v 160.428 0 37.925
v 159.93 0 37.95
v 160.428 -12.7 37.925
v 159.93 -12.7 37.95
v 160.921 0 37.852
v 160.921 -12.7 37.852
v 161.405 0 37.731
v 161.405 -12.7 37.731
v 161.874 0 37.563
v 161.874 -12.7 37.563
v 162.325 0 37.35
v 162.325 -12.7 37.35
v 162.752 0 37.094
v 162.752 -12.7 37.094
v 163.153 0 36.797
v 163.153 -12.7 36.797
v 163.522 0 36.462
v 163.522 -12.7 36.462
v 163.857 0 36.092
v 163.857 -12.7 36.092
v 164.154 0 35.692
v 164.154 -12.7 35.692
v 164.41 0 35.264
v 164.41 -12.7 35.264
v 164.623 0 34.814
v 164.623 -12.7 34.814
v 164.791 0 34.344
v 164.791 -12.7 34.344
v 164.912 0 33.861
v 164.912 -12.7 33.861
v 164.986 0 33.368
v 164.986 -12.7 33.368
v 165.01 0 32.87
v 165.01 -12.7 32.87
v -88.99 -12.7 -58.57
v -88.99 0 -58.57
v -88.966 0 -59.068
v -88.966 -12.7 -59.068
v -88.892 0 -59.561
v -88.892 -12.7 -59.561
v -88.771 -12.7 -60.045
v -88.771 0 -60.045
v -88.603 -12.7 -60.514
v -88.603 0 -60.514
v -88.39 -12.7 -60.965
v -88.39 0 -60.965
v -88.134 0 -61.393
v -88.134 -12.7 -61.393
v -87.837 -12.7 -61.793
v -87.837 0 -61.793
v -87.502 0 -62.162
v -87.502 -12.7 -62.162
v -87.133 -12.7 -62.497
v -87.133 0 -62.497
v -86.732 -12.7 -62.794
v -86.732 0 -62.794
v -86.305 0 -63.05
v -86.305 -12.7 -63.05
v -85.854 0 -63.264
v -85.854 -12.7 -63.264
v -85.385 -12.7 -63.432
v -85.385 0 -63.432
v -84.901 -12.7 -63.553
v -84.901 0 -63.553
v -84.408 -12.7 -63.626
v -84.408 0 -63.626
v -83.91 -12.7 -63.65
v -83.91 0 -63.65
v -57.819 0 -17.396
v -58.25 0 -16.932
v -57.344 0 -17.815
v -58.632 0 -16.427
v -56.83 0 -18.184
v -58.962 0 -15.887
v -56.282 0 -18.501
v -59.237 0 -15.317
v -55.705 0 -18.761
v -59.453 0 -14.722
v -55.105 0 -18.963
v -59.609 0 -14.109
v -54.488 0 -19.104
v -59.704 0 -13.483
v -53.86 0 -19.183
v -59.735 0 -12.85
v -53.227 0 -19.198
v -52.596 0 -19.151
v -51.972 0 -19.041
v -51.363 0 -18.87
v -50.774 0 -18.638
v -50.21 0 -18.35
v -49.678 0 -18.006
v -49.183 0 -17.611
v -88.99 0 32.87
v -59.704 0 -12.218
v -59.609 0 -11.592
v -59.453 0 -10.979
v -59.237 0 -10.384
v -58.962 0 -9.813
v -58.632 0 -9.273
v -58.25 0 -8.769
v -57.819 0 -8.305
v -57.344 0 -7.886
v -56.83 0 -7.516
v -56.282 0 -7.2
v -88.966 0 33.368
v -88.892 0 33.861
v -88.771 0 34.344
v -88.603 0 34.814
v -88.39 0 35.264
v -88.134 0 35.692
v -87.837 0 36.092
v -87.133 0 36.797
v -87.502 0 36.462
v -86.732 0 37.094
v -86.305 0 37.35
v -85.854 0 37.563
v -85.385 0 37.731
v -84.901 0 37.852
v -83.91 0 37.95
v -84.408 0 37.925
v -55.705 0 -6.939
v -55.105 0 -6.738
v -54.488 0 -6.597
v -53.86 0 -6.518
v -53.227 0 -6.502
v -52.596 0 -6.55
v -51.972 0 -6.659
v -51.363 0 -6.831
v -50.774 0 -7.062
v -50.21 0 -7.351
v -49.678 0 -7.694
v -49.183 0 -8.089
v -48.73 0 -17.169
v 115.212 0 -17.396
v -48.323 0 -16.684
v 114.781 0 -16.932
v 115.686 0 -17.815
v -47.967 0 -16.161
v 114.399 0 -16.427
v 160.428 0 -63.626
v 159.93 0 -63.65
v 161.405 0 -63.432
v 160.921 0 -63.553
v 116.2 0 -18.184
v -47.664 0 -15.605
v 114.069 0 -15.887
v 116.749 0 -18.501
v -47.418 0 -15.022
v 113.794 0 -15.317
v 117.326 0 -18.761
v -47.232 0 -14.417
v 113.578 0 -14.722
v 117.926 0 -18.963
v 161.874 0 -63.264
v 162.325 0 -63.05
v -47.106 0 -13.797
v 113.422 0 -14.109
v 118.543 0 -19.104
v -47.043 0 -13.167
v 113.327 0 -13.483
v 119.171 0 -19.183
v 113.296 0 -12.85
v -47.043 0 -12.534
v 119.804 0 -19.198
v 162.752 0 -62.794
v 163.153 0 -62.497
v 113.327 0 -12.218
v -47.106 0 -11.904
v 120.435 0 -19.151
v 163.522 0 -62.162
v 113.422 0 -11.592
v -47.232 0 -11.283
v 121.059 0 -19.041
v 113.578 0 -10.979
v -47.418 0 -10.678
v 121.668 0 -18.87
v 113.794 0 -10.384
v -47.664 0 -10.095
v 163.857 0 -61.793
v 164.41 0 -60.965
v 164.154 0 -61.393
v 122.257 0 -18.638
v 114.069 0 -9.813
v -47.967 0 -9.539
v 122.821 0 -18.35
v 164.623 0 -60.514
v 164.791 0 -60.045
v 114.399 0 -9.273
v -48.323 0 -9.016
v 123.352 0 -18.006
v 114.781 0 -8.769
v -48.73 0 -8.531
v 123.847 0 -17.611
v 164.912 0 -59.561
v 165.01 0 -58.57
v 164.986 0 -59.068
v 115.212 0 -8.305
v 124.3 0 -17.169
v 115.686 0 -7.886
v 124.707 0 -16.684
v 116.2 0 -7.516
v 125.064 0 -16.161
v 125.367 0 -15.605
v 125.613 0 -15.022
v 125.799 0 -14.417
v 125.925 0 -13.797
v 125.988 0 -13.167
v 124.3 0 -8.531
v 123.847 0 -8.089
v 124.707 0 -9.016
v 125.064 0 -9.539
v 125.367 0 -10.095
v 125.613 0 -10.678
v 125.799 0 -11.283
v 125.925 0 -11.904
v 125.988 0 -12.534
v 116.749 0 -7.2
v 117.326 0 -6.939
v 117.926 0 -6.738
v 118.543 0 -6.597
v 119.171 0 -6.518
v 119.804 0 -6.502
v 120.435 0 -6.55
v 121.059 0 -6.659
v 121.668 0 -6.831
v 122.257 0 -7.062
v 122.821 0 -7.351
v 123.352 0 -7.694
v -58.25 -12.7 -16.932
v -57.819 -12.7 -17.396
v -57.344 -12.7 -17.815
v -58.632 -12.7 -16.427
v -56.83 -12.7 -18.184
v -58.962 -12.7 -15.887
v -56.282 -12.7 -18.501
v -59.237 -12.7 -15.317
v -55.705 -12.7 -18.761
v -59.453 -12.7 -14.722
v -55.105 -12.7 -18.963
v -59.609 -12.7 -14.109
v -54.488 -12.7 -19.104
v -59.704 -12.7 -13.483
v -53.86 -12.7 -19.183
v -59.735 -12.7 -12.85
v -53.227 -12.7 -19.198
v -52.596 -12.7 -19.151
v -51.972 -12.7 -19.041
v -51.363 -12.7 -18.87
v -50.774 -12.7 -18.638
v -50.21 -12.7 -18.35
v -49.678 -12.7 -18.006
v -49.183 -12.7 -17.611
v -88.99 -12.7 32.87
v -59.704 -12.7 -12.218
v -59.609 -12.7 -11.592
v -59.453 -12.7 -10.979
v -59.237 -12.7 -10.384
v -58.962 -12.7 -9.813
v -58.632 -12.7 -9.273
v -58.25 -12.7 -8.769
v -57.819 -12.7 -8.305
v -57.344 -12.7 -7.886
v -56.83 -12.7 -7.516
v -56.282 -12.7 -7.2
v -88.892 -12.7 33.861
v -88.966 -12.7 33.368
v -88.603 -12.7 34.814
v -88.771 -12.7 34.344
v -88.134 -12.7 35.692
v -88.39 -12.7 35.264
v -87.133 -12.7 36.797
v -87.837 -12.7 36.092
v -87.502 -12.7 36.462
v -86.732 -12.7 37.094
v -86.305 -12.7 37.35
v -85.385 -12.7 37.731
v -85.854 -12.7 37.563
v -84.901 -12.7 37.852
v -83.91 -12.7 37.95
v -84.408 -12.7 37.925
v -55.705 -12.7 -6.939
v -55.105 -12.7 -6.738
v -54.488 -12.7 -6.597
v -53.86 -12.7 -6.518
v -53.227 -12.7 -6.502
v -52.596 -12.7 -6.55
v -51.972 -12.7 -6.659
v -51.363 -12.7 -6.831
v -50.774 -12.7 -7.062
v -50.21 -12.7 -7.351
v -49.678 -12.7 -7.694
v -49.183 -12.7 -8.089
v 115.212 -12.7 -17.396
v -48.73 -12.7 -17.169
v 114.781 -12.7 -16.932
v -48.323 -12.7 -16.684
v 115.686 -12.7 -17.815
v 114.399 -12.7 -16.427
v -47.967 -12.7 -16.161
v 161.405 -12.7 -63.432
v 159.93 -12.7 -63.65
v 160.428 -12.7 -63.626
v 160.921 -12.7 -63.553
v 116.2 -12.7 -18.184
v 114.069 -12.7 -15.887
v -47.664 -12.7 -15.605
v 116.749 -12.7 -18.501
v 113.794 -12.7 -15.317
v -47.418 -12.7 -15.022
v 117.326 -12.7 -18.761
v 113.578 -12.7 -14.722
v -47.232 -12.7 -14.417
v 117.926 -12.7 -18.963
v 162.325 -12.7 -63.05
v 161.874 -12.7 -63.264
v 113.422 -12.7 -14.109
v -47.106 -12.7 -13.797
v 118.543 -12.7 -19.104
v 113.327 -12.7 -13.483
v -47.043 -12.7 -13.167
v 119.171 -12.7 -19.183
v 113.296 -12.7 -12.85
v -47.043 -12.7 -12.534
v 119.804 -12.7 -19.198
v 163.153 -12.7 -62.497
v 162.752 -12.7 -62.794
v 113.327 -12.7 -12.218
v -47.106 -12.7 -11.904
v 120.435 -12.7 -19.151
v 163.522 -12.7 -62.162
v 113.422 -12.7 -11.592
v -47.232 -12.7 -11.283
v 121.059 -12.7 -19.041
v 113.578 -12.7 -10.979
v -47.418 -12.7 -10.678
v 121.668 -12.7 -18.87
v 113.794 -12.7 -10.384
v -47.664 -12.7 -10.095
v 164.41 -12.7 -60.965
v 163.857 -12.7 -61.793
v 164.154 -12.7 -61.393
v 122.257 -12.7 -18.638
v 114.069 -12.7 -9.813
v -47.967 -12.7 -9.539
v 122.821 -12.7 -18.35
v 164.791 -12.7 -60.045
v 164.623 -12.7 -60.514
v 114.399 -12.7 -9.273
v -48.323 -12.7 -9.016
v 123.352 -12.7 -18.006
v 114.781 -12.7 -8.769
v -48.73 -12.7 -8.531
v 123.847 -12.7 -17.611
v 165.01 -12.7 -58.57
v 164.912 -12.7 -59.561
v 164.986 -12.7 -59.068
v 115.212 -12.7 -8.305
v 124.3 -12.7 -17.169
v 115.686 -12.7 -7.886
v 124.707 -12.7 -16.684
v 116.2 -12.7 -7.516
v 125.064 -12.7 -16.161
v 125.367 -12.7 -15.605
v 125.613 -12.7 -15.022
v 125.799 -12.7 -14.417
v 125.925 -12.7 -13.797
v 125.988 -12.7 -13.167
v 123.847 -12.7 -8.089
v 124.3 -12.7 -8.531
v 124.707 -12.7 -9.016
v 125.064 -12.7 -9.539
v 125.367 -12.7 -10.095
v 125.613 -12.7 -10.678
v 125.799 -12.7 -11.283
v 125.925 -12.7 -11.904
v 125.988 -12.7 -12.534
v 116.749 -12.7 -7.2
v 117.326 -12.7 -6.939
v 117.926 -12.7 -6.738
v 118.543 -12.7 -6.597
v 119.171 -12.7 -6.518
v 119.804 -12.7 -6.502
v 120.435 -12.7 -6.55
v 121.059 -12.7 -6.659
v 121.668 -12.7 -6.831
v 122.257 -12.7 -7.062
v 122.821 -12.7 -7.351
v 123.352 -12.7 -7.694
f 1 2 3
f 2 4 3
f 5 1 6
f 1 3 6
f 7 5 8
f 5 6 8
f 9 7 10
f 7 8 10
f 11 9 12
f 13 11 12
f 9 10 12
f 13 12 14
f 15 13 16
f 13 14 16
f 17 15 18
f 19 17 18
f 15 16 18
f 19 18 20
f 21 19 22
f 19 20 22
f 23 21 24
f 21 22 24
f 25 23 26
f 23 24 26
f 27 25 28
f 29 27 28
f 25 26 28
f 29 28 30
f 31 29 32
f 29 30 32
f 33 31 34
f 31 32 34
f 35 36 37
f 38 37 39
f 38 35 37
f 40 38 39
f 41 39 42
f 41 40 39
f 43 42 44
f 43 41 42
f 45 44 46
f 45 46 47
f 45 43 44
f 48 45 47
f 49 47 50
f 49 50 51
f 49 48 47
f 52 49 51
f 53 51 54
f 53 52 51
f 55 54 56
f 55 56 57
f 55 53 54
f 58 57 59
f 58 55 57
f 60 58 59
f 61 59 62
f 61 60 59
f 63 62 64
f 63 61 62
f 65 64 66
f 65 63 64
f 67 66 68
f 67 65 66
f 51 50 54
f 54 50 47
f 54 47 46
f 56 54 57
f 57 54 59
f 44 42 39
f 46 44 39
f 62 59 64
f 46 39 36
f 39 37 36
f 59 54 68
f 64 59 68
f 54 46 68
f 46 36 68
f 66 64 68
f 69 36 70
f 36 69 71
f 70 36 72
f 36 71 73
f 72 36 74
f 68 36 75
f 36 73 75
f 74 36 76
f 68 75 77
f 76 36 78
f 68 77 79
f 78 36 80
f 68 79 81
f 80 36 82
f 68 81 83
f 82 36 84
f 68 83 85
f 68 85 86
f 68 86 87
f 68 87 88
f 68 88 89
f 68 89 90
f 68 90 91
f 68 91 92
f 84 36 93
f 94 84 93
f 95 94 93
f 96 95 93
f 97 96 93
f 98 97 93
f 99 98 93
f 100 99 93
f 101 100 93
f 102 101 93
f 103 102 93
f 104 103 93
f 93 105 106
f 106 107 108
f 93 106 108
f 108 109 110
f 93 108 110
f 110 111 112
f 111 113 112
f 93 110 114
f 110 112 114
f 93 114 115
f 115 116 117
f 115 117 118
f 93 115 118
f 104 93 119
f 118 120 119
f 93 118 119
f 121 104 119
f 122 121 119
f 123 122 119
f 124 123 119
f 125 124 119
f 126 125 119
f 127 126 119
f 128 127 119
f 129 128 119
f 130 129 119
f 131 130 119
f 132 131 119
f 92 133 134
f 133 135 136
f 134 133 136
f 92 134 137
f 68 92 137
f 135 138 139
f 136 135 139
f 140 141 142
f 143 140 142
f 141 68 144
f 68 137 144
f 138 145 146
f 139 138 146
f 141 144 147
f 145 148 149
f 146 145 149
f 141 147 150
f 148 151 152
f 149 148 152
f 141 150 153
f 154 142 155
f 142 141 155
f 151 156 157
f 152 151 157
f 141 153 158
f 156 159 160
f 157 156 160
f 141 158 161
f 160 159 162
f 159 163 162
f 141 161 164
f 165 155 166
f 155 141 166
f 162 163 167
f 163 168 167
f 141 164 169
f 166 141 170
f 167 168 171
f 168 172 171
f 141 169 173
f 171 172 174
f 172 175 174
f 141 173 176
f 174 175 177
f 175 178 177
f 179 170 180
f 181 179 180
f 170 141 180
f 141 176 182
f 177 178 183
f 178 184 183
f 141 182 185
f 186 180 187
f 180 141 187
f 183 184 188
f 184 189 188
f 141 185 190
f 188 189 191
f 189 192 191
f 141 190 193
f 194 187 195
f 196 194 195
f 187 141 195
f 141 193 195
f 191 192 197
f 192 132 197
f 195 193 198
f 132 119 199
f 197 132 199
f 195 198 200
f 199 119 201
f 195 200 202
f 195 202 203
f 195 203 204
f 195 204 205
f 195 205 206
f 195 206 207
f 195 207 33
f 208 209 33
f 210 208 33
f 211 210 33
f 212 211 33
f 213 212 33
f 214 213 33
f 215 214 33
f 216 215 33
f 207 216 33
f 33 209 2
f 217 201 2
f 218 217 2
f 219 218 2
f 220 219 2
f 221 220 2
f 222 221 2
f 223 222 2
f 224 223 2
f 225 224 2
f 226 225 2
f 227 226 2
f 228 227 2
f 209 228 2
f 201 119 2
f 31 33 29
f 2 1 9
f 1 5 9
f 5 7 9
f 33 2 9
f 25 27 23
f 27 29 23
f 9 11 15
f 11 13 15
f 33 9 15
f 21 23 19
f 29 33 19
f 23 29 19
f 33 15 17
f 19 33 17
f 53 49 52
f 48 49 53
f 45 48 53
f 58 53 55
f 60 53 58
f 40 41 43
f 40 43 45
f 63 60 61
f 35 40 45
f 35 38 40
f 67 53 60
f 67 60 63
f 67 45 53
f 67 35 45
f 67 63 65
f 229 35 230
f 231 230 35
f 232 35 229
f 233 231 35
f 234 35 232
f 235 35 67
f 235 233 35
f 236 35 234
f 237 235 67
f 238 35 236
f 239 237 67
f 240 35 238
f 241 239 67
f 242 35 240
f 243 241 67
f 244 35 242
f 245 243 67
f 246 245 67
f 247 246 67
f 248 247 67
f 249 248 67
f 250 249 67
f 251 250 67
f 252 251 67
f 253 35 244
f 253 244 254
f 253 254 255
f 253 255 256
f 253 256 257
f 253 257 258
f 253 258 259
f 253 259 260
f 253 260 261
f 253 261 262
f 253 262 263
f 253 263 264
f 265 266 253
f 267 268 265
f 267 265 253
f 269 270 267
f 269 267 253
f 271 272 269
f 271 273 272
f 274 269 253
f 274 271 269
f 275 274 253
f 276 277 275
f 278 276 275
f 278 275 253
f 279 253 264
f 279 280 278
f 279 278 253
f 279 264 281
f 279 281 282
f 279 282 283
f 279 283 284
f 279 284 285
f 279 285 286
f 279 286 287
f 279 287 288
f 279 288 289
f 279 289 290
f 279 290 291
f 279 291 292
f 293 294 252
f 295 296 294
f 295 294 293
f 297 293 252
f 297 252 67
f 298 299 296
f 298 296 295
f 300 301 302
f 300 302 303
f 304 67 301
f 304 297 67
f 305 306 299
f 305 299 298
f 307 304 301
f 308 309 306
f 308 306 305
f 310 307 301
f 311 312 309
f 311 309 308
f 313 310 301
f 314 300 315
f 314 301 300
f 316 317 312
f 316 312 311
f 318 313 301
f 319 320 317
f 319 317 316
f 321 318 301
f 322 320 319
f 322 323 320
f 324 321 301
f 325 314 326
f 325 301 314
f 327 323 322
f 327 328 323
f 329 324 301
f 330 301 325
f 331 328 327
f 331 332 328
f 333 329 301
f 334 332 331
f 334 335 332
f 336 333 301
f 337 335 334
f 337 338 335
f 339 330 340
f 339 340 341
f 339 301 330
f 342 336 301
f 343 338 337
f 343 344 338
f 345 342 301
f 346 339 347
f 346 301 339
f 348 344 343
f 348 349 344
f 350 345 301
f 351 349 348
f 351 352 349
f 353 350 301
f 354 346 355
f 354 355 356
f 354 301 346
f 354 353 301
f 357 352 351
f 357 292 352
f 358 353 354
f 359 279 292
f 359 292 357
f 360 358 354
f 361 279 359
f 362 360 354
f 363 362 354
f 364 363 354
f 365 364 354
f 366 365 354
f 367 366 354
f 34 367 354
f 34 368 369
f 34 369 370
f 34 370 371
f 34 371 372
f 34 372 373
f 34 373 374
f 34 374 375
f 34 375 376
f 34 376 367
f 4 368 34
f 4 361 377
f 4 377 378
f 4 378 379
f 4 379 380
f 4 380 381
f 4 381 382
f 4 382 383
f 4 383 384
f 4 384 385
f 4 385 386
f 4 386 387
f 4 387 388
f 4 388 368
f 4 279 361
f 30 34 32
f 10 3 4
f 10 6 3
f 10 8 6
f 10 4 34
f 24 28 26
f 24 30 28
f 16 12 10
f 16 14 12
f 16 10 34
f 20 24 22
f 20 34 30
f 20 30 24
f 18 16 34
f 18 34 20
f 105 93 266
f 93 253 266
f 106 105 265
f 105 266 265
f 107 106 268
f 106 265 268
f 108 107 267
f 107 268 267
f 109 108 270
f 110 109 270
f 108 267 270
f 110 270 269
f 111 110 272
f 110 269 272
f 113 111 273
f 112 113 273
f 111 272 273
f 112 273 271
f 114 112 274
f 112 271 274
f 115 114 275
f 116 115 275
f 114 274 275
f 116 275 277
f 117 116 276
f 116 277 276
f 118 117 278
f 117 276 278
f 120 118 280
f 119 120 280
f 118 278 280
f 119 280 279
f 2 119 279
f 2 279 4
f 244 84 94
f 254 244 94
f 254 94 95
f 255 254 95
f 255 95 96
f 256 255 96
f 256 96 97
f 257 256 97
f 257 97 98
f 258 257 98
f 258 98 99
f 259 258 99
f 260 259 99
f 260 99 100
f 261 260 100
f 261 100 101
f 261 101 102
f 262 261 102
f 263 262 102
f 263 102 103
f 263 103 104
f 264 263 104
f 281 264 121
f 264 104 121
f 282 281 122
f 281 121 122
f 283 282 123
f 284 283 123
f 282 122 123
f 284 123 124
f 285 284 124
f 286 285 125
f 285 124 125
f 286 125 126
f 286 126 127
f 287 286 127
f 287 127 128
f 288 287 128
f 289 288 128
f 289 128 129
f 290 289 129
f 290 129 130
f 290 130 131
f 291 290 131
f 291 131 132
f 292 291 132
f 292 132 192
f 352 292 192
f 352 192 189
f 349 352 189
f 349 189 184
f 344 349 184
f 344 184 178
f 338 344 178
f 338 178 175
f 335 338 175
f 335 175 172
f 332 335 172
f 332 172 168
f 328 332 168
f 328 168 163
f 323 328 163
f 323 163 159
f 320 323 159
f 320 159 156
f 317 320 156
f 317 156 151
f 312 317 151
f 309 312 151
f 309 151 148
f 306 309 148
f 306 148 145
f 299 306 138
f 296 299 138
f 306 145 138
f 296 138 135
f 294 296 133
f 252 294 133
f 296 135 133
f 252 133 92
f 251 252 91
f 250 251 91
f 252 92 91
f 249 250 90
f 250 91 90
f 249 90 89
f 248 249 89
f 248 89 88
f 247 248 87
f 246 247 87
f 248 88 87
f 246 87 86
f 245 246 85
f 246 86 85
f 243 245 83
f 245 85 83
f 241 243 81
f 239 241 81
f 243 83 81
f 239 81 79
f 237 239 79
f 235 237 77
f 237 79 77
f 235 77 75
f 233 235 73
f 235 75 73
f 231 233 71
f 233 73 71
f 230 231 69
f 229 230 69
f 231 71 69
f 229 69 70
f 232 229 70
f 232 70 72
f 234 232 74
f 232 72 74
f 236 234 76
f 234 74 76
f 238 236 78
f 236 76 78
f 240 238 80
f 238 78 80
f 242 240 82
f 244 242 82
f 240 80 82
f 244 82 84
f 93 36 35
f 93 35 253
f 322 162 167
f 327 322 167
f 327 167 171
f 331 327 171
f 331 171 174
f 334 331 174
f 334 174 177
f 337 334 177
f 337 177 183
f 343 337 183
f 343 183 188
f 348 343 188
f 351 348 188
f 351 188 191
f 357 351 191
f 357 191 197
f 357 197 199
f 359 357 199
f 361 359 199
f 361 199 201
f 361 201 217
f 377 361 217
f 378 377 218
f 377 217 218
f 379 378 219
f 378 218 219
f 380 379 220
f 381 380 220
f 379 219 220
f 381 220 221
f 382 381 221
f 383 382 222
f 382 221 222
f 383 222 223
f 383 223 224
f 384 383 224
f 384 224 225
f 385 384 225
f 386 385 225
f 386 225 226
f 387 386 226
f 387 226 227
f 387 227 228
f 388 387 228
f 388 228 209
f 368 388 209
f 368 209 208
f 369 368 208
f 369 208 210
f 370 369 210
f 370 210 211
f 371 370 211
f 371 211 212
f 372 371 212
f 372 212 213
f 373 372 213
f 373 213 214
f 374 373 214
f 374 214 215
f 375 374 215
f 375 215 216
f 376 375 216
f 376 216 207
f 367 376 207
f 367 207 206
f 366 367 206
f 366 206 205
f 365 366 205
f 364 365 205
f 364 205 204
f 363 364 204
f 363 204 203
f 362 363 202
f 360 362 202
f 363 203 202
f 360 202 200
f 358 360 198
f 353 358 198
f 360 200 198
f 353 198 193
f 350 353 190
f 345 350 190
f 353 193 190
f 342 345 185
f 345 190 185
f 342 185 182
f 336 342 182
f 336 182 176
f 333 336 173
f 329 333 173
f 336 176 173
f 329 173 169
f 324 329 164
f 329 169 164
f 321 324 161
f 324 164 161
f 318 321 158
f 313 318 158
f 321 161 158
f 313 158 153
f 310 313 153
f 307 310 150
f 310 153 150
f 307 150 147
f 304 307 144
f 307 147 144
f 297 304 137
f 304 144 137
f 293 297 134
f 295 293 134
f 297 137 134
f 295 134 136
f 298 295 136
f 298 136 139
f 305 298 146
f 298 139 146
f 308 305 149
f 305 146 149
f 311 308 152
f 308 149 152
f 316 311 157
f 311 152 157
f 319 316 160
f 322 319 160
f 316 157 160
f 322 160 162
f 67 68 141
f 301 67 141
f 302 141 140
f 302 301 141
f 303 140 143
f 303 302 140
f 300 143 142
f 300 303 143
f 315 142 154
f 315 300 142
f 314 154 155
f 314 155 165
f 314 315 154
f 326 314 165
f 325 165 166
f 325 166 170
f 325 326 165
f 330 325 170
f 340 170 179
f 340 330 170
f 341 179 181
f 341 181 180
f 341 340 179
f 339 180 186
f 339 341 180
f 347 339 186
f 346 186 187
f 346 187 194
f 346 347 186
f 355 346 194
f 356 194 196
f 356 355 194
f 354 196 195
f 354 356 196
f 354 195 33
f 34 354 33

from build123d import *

# Parameters (mm, degrees)
F0_W     = 254
F0_H     = 101.6
F1_DEPTH = 12.7
F3_D     = 12.7
F4_R     = 5.08
F5_R     = 5.08
F6_R     = 5.08
F7_R     = 5.08


with BuildPart() as f1:
    # F0 (on Front) → F1 (new body)
    with BuildSketch(Plane.XZ):
        with Locations((38.009989, -12.850277)):
            Rectangle(F0_W, F0_H)
    extrude(amount=F1_DEPTH)

    # F3 (through all)
    with Locations(Plane.XZ.offset(12.7)):
        with Locations((-53.385181, -12.850277), (119.645597, -12.850277)):
            Hole(F3_D / 2)

    # F4
    f4_edges = [f1.edges().sort_by_distance(p)[0] for p in [
        (-88.990011, -6.35, 37.949723),
    ]]
    fillet(f4_edges, radius=F4_R)

    # F5
    f5_edges = [f1.edges().sort_by_distance(p)[0] for p in [
        (165.009989, -6.35, 37.949723),
    ]]
    fillet(f5_edges, radius=F5_R)

    # F6
    f6_edges = [f1.edges().sort_by_distance(p)[0] for p in [
        (-88.990011, -6.35, -63.650277),
    ]]
    fillet(f6_edges, radius=F6_R)

    # F7
    f7_edges = [f1.edges().sort_by_distance(p)[0] for p in [
        (165.009989, -6.35, -63.650277),
    ]]
    fillet(f7_edges, radius=F7_R)


solid = f1.part
